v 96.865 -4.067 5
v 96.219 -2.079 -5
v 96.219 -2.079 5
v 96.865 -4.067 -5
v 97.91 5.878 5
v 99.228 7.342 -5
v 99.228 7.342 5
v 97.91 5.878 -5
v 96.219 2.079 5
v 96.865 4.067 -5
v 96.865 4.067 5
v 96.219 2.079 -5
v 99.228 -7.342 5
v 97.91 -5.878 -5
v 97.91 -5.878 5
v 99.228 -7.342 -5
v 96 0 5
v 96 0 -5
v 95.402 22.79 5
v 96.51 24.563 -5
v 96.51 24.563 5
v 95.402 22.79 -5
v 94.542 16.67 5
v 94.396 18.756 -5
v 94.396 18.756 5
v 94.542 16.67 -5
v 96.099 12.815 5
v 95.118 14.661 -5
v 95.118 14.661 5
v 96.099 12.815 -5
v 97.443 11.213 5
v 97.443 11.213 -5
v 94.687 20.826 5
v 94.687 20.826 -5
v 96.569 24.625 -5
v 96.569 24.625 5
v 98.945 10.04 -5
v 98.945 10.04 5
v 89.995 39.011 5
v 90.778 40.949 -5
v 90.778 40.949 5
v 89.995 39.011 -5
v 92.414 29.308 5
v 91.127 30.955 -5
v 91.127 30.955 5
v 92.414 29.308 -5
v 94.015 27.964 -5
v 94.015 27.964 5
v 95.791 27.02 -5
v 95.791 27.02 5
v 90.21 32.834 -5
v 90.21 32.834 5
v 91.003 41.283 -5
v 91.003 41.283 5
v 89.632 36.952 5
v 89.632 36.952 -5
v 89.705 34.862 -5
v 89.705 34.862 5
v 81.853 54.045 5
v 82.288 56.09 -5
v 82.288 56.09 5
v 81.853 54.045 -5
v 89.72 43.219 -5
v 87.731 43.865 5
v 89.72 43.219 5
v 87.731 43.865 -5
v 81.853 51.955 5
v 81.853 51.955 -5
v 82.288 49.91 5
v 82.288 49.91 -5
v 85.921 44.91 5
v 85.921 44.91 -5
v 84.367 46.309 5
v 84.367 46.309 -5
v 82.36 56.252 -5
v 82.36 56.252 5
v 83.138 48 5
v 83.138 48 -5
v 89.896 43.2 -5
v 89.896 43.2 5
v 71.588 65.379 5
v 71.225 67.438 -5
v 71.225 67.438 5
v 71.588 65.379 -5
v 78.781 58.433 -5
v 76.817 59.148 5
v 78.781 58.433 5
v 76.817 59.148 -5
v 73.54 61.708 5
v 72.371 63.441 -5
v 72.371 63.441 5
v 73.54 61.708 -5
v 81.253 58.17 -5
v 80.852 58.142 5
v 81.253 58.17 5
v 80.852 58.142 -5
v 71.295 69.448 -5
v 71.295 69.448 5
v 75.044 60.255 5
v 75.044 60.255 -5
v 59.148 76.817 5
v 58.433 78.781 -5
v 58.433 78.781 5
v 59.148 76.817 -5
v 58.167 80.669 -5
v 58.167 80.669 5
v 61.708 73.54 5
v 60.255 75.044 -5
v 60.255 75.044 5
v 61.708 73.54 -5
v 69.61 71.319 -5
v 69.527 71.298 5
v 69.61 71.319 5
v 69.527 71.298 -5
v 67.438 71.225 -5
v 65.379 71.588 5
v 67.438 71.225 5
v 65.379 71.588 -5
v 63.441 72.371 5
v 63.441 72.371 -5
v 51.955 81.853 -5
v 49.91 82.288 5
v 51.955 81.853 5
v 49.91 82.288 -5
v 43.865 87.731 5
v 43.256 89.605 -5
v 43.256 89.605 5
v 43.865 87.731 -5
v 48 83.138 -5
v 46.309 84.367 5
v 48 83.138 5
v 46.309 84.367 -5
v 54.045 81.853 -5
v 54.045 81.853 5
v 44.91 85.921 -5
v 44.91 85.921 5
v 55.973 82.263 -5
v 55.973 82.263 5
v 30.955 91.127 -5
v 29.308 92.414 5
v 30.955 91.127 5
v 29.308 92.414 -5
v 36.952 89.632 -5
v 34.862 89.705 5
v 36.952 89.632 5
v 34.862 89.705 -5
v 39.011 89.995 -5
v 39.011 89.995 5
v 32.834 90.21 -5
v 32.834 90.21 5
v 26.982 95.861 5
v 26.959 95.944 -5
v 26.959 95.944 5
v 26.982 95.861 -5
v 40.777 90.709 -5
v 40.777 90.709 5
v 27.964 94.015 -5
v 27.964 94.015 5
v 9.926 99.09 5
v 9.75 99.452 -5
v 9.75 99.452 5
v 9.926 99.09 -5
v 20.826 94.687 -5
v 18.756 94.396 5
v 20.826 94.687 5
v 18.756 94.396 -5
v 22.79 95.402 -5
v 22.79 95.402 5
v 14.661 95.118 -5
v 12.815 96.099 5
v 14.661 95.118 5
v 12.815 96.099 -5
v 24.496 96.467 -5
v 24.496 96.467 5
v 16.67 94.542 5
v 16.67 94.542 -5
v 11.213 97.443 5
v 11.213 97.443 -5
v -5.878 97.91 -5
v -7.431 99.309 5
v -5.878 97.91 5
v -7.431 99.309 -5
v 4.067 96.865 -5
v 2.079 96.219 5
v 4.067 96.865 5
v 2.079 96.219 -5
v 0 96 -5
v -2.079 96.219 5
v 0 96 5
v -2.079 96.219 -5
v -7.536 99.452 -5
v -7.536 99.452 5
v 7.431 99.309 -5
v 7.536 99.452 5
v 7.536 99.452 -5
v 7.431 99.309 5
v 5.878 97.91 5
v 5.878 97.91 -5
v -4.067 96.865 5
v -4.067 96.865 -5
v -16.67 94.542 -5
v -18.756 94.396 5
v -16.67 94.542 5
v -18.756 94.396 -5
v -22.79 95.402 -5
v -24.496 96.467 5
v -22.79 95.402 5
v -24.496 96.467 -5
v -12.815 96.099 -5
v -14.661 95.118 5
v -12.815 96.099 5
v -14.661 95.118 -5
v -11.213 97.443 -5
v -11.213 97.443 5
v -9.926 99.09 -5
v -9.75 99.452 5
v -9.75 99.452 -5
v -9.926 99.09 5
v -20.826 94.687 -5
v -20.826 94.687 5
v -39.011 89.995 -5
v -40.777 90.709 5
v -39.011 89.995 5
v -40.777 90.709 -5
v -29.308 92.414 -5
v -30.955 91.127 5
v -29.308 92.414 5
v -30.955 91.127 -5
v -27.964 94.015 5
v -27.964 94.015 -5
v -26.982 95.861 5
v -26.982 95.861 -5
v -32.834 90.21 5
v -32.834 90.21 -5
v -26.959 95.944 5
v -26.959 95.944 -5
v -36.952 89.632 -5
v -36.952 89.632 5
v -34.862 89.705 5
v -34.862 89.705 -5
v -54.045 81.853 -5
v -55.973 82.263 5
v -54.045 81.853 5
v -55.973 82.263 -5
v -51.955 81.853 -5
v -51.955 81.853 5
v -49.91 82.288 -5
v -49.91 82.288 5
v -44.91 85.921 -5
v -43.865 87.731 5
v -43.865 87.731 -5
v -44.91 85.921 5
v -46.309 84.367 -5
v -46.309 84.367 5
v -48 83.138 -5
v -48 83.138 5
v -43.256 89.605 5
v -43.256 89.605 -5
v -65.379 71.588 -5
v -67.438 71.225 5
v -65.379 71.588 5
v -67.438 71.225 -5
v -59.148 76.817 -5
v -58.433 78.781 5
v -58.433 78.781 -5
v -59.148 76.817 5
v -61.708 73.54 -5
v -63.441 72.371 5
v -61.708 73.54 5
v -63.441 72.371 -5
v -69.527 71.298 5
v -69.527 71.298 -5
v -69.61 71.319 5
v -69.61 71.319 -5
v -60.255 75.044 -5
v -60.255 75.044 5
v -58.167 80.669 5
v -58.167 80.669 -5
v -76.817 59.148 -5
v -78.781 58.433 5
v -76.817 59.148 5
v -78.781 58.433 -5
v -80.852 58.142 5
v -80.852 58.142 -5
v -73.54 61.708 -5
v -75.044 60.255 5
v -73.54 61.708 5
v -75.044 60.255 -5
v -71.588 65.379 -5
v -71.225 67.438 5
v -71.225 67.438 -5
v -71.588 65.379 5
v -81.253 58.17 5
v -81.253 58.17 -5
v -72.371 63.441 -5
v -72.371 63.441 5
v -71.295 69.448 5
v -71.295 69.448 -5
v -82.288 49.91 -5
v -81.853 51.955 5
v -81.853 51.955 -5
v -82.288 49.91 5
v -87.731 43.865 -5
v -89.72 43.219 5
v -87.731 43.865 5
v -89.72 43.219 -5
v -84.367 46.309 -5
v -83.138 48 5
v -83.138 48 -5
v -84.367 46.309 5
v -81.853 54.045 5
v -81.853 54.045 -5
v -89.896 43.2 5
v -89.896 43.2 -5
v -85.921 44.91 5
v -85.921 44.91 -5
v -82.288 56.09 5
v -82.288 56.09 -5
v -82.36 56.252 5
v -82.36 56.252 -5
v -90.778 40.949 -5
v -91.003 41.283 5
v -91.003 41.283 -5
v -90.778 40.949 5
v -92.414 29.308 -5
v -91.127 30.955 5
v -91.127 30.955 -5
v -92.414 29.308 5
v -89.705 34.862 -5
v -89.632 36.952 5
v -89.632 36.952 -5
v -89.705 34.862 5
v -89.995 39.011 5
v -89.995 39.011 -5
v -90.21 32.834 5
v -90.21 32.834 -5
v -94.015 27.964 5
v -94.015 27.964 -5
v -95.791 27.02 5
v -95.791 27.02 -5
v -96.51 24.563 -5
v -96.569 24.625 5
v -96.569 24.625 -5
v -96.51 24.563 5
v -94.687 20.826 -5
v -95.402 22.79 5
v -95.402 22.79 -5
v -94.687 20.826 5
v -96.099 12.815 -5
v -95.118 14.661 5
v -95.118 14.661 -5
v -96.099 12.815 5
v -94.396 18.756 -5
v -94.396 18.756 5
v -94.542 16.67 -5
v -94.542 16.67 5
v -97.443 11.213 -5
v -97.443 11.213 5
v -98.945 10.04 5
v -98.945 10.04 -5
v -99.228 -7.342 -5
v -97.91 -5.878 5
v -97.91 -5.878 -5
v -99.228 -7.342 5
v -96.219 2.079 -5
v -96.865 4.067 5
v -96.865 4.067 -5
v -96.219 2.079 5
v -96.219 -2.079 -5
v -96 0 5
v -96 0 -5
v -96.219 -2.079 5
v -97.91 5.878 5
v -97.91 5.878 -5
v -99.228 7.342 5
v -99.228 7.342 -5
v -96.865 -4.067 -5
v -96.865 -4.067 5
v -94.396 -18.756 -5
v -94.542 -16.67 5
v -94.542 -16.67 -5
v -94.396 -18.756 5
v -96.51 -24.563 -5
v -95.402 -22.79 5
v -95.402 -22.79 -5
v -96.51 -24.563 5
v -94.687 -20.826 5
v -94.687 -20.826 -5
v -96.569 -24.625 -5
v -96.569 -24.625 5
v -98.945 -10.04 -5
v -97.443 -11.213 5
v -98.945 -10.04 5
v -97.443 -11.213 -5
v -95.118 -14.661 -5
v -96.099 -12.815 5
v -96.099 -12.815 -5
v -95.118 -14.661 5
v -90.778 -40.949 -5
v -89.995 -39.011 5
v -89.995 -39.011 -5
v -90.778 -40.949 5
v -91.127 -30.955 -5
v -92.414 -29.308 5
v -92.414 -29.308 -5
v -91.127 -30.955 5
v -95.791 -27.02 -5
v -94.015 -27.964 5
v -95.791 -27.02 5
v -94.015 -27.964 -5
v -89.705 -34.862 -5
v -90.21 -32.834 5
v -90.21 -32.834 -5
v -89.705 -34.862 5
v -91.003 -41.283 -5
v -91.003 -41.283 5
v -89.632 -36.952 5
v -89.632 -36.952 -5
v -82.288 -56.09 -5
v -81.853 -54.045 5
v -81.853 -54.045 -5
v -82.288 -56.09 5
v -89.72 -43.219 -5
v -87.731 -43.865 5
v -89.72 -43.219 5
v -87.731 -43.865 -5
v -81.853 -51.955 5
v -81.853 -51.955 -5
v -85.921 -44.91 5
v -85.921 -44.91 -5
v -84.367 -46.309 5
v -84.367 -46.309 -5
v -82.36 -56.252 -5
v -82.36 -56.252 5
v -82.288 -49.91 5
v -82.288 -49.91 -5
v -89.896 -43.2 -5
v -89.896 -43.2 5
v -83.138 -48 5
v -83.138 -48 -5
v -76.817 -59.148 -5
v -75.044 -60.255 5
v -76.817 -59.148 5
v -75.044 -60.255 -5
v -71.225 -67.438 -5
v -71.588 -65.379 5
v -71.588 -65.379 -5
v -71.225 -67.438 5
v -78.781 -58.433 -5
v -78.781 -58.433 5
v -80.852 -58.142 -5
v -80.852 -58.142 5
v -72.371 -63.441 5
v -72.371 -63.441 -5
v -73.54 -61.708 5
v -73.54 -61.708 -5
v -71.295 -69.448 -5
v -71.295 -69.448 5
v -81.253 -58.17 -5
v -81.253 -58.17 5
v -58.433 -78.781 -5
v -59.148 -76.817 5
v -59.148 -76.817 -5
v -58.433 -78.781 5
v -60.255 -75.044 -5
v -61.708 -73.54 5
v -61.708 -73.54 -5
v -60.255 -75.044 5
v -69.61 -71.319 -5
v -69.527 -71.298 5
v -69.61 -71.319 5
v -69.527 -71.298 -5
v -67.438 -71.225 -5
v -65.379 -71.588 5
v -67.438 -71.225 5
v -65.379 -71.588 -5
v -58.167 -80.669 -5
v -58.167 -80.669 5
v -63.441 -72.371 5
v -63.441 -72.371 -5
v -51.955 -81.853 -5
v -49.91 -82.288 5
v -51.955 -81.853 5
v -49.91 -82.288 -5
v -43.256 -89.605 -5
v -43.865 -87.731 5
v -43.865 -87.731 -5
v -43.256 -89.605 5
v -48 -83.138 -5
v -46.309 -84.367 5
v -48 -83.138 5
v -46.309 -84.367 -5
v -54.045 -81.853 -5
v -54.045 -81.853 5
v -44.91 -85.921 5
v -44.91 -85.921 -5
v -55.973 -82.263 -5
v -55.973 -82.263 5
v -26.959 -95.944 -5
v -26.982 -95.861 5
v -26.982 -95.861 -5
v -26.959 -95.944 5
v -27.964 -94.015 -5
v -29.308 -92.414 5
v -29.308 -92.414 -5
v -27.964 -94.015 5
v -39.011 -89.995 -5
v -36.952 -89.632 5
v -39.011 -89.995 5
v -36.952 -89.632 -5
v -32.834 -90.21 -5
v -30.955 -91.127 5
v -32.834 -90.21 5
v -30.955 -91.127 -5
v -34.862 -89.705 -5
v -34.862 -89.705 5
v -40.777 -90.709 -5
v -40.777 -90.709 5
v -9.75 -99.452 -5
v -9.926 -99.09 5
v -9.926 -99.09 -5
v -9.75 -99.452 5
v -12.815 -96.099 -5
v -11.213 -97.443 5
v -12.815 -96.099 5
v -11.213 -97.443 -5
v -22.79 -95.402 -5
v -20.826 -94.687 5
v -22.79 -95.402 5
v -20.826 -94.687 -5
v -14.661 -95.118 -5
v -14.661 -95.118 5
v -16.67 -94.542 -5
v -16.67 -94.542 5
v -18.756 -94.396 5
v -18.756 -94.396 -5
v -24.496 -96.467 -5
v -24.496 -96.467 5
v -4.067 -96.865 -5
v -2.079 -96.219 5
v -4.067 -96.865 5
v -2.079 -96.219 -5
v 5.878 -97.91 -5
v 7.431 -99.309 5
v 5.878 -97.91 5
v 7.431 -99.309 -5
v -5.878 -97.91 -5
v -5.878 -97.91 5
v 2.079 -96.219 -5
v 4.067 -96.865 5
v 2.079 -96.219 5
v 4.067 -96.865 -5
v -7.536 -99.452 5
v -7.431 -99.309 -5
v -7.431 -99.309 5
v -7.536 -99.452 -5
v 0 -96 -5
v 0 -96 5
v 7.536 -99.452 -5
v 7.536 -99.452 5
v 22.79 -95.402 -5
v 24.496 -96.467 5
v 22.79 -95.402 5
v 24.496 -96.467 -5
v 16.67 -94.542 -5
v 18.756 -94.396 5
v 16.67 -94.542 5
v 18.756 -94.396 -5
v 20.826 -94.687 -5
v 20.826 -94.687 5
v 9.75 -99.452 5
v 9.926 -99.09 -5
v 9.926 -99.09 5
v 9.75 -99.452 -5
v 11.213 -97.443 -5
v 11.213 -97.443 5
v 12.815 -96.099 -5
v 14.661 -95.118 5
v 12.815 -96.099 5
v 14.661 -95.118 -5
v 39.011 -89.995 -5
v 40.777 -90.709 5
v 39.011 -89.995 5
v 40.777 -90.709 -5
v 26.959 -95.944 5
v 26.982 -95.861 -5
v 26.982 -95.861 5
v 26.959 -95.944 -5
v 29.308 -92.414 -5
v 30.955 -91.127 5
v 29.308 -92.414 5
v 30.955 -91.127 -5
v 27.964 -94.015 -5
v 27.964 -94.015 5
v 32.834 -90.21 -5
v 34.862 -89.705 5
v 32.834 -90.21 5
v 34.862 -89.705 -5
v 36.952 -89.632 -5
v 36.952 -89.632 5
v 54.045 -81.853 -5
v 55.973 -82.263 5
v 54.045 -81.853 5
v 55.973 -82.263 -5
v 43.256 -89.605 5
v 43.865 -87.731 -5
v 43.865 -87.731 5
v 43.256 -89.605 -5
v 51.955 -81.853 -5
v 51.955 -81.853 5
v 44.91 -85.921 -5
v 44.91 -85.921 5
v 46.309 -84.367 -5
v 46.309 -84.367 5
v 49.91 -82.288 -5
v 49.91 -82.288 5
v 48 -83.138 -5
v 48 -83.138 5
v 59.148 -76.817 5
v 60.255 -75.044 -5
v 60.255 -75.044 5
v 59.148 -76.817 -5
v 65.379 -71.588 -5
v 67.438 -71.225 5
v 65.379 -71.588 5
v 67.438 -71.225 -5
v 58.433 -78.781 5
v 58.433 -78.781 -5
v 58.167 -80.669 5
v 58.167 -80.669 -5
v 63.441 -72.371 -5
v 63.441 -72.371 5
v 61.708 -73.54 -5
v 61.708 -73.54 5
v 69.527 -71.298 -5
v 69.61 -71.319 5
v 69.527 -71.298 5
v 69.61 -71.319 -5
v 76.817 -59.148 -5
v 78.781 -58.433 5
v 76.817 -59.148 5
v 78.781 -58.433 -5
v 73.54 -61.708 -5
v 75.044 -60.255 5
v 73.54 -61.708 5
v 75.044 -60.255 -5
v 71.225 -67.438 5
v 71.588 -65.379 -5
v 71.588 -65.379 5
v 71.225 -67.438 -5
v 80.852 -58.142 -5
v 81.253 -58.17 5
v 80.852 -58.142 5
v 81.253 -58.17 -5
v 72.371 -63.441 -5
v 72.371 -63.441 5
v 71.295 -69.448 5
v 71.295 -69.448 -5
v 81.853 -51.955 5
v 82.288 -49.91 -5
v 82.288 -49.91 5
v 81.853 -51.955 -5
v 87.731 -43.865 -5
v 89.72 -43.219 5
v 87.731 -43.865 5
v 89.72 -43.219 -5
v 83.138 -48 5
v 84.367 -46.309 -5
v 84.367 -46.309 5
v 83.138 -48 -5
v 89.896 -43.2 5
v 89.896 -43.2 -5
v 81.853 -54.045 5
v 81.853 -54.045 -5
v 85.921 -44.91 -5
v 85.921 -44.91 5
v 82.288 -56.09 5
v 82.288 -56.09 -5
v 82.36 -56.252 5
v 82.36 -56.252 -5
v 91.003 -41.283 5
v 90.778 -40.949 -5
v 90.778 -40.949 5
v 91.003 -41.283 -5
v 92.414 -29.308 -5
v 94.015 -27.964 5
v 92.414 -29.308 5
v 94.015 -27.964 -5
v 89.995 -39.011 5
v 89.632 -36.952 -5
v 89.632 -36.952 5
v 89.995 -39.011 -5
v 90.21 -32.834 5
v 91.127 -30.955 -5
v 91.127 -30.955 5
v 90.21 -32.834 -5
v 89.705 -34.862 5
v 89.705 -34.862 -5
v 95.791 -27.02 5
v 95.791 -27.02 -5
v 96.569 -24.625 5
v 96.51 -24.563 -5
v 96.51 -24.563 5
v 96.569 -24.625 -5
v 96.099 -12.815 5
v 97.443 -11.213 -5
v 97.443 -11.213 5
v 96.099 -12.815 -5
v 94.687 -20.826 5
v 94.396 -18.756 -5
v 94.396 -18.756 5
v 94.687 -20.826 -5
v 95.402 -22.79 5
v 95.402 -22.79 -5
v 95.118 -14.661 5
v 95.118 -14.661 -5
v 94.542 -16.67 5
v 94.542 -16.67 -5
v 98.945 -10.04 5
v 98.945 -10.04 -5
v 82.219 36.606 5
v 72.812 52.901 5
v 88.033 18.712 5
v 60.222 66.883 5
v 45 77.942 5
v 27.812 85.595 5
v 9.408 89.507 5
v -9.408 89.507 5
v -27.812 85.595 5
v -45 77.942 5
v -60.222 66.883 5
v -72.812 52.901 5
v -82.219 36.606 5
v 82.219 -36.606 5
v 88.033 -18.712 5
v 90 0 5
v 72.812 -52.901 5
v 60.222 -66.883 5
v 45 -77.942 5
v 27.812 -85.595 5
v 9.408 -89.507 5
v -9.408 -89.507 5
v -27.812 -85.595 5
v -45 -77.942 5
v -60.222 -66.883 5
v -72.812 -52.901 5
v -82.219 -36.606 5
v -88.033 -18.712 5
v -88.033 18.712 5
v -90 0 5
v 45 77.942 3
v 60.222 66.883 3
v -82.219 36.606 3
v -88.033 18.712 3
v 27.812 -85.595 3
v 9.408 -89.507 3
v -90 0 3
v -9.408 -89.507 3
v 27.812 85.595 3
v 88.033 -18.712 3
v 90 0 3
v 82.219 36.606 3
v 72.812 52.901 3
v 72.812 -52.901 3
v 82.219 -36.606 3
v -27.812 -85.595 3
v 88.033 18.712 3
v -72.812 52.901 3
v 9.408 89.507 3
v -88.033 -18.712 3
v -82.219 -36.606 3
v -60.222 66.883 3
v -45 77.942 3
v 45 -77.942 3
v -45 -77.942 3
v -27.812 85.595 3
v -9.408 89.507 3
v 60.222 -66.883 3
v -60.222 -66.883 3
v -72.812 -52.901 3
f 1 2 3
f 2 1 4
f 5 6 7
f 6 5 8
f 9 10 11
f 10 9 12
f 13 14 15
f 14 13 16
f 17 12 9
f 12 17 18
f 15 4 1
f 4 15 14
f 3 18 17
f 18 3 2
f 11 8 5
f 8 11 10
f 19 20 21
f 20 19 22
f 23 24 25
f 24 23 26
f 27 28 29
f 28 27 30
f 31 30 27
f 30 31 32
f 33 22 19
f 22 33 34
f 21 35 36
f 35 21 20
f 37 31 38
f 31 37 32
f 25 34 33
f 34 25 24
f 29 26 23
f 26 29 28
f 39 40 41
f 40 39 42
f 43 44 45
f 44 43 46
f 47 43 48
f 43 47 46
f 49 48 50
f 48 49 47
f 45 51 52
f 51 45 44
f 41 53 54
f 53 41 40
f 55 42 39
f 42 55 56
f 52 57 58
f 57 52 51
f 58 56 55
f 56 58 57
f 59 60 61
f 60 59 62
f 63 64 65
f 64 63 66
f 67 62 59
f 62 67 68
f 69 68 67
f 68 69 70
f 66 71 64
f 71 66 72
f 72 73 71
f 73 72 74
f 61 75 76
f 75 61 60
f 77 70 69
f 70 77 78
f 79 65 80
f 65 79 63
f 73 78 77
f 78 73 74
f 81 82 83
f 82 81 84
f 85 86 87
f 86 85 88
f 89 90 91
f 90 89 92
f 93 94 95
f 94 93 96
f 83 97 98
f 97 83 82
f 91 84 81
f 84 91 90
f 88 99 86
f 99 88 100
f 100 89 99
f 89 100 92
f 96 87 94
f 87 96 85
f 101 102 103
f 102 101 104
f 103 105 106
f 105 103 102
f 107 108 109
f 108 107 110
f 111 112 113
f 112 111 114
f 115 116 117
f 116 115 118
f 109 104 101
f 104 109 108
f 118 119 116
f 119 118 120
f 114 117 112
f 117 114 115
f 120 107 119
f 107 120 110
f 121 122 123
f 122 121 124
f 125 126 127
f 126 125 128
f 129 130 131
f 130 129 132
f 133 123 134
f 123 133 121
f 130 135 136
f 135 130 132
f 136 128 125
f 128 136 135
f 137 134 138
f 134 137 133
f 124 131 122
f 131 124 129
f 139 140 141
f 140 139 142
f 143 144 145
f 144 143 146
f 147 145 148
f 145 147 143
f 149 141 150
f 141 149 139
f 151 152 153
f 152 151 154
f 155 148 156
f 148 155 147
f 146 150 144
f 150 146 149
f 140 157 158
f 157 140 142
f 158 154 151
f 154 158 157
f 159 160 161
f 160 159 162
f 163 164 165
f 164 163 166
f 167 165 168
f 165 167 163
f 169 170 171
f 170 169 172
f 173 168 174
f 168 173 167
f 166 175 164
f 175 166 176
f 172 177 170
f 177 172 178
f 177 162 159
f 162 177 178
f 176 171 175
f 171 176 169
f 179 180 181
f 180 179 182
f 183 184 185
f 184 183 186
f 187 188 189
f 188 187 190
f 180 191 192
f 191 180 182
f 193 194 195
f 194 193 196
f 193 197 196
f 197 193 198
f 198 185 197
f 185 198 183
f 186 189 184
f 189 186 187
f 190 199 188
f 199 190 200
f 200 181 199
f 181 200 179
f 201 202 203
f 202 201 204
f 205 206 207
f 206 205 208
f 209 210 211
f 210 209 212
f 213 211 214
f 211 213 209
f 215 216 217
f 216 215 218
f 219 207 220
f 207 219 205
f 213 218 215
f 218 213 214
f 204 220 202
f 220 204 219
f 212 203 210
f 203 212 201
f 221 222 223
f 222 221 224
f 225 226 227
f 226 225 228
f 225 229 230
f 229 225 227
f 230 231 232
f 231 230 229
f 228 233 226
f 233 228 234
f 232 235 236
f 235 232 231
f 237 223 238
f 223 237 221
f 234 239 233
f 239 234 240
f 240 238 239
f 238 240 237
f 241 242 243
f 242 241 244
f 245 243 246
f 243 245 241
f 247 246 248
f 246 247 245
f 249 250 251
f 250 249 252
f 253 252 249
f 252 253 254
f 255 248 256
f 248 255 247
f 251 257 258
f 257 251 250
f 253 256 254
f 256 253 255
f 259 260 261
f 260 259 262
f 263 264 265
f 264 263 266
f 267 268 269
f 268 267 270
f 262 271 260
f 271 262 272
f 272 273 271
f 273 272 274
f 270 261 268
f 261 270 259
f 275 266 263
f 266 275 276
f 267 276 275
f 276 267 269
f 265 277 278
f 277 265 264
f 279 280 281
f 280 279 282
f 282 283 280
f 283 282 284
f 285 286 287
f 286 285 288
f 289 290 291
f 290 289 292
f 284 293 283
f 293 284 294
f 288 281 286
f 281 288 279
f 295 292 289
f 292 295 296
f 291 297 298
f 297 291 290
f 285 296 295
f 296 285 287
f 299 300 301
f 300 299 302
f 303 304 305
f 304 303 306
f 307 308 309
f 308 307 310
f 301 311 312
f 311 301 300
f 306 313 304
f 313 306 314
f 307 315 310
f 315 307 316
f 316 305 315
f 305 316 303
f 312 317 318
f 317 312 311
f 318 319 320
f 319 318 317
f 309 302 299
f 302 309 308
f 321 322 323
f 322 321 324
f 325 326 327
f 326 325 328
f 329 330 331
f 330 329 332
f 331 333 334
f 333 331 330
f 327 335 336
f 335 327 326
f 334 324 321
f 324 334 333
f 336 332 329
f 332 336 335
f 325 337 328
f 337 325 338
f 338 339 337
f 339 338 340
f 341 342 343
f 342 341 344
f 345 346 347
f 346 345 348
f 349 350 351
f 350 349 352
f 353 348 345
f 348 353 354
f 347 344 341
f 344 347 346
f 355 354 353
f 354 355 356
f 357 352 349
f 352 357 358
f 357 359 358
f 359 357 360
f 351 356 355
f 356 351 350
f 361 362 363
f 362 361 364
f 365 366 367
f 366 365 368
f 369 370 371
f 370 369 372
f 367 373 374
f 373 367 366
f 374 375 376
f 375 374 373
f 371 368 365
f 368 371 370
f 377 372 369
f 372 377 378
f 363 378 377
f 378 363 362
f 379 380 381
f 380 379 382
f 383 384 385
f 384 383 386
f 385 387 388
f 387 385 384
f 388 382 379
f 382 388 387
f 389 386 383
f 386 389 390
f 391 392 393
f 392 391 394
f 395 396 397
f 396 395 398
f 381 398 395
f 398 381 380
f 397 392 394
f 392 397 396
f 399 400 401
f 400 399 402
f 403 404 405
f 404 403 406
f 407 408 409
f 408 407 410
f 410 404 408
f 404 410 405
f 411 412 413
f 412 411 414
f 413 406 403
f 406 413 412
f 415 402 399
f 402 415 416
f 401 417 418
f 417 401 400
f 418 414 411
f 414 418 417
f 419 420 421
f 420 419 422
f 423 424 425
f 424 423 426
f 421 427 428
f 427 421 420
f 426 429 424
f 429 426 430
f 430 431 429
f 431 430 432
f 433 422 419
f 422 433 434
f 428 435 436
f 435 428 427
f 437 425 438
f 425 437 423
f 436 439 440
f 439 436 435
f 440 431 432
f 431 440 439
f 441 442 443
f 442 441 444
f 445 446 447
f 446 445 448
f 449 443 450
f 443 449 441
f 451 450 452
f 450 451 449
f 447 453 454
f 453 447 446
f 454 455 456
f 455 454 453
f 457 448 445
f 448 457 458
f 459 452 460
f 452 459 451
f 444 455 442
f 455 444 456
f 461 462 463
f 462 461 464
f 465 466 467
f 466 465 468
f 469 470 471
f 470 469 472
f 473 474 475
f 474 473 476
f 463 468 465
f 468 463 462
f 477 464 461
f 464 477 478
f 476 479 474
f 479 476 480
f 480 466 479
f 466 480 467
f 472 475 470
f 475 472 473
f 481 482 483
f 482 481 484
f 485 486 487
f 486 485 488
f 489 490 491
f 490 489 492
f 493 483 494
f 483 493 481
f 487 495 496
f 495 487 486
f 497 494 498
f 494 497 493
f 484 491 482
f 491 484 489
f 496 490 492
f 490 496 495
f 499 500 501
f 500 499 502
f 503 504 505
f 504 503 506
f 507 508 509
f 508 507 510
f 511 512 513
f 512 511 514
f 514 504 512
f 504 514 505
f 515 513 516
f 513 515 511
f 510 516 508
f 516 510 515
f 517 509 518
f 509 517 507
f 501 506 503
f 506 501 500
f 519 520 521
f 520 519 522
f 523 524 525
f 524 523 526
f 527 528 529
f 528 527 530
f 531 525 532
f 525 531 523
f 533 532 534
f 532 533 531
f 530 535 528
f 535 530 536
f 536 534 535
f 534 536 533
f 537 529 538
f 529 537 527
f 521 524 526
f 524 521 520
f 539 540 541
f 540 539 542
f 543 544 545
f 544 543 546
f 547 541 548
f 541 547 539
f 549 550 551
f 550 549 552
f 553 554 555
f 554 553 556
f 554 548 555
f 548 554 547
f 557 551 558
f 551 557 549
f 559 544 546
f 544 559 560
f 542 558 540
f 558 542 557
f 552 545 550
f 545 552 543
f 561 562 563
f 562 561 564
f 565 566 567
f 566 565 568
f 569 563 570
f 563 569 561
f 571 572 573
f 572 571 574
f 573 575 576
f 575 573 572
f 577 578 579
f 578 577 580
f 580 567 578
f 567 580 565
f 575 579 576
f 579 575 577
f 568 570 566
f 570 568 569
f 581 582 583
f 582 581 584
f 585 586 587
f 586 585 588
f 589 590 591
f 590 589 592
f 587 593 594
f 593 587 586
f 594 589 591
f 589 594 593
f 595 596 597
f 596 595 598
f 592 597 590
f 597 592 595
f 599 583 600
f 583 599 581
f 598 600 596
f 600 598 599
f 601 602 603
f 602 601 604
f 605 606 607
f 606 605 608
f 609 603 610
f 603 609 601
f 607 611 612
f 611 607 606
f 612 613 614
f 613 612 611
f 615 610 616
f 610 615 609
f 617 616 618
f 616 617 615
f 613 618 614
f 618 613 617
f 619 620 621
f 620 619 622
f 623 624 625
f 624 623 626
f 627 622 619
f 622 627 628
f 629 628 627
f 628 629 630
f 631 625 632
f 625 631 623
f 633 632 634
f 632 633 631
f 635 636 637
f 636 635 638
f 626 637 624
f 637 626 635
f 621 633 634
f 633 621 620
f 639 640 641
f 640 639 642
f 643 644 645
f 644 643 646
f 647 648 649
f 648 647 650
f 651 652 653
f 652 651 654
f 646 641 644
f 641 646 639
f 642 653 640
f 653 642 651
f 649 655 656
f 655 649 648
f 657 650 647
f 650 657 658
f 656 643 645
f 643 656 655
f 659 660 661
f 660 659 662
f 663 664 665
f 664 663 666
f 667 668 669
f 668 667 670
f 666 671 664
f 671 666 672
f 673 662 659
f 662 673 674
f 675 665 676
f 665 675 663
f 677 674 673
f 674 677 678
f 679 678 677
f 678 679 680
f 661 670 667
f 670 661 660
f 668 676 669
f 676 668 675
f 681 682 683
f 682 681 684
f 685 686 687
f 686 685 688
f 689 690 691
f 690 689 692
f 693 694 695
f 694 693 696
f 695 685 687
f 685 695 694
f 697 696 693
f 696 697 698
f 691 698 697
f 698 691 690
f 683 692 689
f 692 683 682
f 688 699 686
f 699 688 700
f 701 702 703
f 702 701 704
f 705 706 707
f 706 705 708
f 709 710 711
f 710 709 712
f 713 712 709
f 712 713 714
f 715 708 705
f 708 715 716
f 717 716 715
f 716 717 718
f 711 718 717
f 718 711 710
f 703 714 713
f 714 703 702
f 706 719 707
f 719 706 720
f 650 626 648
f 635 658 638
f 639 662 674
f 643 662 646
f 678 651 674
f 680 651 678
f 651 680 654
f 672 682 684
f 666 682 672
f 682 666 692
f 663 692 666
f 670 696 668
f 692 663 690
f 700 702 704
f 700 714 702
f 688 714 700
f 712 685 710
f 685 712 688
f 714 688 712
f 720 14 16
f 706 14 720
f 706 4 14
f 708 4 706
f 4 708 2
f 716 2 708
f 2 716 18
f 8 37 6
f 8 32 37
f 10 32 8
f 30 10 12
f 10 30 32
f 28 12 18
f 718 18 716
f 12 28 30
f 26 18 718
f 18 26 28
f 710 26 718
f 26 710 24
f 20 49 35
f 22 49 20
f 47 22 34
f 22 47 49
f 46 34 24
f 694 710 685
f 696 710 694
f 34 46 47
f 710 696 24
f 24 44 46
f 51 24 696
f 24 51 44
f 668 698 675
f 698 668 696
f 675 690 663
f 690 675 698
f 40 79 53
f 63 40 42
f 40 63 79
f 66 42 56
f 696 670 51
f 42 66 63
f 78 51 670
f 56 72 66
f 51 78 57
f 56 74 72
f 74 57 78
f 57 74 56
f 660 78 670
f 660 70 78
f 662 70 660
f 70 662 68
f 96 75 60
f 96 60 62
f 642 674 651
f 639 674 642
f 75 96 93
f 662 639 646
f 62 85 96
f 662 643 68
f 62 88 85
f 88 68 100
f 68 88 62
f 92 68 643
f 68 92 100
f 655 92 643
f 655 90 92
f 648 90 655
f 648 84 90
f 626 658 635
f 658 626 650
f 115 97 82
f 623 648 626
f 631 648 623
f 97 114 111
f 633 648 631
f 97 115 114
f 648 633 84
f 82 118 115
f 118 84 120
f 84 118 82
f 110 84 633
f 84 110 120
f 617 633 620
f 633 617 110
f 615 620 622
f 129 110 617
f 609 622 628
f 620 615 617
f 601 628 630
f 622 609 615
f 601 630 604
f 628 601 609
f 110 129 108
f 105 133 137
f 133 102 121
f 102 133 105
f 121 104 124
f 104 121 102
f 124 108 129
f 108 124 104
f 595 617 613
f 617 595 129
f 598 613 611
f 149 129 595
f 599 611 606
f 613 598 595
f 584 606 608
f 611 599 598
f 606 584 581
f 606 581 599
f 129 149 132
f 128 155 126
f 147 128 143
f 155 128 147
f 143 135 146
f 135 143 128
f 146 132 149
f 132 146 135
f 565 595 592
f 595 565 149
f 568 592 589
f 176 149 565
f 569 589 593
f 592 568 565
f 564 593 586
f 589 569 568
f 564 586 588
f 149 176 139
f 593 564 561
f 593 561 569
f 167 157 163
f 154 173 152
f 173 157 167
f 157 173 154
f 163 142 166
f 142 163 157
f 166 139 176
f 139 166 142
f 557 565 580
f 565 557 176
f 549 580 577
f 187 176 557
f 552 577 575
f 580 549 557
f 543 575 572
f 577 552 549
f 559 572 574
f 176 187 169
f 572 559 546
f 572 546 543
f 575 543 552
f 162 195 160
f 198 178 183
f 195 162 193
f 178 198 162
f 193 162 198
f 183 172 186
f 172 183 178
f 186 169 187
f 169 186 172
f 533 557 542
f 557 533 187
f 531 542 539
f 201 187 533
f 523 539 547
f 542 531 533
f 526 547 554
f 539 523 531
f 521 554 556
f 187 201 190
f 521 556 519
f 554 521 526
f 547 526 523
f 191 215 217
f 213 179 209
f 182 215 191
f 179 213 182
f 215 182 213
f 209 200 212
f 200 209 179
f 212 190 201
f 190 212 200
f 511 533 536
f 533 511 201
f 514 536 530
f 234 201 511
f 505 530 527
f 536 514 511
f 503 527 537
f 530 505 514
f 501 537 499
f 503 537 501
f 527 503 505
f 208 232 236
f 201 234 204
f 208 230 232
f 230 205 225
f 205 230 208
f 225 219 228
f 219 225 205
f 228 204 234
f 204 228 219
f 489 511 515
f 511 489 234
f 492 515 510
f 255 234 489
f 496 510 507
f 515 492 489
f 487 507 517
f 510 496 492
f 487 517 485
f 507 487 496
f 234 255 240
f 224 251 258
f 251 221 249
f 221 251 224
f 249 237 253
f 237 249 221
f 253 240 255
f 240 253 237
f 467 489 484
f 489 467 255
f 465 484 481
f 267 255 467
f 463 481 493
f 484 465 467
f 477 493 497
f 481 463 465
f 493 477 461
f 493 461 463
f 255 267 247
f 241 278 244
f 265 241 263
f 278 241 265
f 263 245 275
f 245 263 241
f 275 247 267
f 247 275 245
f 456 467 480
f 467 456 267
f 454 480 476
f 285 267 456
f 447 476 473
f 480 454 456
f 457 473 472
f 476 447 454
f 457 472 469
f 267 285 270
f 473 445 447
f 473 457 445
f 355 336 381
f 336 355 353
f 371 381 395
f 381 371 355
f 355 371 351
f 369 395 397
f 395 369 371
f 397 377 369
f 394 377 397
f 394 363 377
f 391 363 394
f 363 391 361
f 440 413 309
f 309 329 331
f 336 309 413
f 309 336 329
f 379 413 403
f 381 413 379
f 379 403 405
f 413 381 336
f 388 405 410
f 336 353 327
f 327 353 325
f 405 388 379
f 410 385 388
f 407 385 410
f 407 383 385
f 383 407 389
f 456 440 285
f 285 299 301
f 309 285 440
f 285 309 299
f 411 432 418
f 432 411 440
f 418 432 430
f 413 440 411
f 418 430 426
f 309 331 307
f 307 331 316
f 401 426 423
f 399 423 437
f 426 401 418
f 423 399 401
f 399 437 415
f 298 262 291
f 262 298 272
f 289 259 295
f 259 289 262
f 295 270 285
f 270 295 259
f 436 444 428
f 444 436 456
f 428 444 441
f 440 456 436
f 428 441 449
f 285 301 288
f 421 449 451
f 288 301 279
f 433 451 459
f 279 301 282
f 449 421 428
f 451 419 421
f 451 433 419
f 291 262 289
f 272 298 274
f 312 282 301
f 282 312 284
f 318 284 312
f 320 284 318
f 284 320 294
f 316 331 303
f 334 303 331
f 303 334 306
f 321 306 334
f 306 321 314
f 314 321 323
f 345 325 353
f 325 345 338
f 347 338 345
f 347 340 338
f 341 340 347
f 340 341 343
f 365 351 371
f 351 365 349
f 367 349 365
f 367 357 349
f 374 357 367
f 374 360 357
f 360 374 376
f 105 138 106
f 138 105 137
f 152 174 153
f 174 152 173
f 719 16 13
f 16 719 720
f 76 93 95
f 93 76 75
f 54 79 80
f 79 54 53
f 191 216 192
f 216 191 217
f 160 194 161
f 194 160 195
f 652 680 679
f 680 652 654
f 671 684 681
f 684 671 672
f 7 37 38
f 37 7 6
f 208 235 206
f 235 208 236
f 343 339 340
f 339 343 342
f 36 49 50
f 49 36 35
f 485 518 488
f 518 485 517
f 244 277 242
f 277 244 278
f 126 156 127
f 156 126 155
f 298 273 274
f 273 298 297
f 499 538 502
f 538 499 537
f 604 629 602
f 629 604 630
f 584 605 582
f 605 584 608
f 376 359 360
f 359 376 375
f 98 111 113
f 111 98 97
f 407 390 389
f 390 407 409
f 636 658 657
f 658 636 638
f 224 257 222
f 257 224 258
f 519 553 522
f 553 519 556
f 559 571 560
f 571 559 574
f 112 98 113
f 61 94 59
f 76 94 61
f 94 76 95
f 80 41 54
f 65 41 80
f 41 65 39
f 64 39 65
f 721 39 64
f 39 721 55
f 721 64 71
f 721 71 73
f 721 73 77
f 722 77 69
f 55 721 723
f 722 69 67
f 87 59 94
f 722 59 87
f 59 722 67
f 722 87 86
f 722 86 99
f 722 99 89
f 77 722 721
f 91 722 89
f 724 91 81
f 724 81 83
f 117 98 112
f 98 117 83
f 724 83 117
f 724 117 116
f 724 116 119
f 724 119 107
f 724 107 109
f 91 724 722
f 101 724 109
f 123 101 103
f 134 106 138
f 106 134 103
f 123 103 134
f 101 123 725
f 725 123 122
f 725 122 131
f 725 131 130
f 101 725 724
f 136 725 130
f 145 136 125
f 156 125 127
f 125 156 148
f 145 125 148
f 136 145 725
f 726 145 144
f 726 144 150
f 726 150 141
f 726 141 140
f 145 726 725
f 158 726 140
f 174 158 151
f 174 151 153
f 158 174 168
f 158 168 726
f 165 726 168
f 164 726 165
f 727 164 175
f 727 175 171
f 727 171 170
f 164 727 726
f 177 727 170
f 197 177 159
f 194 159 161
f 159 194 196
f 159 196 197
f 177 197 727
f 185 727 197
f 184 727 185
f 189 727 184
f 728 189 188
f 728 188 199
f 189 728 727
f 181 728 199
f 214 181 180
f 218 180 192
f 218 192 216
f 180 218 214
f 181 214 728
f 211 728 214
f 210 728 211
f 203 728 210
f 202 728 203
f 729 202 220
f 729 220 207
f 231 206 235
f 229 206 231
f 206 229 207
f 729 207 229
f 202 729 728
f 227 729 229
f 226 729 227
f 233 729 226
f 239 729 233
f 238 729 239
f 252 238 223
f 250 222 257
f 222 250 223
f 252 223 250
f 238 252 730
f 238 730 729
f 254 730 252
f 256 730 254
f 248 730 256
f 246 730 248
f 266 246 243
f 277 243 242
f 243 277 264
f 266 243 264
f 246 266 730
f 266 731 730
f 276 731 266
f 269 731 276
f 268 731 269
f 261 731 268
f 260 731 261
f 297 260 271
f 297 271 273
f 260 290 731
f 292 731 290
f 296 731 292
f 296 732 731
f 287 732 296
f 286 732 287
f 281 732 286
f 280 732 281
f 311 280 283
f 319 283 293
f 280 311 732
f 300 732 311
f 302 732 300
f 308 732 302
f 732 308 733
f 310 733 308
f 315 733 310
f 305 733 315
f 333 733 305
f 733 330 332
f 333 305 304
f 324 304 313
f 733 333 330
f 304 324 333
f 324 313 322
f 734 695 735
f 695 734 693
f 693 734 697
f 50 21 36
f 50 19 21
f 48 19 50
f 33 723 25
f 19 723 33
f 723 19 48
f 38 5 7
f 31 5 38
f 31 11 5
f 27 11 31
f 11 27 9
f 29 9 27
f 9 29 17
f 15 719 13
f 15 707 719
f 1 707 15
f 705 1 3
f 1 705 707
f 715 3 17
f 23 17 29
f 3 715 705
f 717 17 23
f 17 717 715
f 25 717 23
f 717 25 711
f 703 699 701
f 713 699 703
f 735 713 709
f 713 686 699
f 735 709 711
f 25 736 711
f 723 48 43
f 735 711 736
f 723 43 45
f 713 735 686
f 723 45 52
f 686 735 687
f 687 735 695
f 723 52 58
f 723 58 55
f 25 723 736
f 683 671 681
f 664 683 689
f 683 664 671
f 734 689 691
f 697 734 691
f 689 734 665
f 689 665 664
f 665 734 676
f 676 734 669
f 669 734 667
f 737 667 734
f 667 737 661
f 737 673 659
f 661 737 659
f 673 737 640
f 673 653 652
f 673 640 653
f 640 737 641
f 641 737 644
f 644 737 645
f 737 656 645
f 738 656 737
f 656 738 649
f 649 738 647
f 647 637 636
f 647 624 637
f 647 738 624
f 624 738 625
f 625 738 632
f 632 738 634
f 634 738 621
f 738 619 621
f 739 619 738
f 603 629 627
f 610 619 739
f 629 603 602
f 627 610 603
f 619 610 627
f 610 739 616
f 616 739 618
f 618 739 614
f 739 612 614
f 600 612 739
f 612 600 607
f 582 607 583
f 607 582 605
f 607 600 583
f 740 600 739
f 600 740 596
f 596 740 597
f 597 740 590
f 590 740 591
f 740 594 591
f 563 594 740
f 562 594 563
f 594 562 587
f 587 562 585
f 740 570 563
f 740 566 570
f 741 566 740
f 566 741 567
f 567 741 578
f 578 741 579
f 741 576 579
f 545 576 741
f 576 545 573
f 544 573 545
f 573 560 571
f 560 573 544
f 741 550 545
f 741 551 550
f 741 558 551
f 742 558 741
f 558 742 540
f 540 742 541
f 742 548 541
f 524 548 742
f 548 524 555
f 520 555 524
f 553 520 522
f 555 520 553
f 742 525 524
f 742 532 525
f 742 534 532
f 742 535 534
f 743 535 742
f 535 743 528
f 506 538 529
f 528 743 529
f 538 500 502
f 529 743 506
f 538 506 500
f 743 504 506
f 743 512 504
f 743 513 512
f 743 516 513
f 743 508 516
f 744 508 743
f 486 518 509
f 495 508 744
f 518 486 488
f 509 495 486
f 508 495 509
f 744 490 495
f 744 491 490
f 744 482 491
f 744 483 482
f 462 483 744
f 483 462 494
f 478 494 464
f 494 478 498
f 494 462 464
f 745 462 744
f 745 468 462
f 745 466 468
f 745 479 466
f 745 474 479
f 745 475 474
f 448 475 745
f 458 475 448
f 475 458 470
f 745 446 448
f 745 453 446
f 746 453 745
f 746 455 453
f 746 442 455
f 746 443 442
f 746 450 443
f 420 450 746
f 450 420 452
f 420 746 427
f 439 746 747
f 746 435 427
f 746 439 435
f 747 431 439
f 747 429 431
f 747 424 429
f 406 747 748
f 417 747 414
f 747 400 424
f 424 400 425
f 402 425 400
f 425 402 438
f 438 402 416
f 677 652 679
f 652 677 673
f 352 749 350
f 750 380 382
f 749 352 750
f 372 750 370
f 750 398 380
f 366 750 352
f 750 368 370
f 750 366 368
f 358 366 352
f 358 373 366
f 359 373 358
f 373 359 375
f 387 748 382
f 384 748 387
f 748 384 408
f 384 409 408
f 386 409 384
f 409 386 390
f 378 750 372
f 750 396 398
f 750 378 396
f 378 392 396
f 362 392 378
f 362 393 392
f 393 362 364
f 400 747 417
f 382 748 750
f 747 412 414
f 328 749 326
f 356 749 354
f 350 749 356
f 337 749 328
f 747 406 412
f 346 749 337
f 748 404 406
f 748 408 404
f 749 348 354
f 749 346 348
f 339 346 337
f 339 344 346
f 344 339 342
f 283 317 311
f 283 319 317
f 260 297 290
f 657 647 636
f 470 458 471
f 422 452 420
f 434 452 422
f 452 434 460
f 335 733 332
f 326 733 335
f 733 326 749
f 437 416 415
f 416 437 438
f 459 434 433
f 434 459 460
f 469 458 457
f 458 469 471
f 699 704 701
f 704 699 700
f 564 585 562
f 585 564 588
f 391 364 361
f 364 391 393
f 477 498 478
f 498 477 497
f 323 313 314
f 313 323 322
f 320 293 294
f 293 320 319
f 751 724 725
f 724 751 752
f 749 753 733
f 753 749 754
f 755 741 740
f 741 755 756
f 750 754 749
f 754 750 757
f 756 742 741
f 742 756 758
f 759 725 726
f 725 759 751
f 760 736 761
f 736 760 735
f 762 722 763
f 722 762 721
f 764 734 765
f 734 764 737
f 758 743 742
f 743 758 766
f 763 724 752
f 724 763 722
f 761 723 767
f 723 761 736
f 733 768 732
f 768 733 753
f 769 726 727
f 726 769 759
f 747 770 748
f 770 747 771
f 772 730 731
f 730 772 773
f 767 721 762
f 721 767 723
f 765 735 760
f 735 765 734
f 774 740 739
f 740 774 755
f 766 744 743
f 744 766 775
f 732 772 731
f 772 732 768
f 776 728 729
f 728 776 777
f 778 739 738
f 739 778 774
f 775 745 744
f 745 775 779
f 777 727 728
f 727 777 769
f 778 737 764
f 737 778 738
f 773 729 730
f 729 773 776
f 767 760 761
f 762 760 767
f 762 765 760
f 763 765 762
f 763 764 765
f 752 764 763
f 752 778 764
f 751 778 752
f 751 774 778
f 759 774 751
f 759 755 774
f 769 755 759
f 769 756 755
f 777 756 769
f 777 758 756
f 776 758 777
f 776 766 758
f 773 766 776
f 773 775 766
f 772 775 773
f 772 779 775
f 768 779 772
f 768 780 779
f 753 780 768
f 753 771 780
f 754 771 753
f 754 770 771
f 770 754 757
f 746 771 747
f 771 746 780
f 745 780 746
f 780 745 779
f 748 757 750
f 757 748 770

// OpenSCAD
difference() {
  cylinder(r=100, h=10, center=true);
  translate([0,0,8]) cylinder(r=90, h=10, center=true);
  for(angle=[0:10:350]) {
    rotate(angle) translate([106,0,0]) cylinder(r=10, h=12, center=true);
  }
}
